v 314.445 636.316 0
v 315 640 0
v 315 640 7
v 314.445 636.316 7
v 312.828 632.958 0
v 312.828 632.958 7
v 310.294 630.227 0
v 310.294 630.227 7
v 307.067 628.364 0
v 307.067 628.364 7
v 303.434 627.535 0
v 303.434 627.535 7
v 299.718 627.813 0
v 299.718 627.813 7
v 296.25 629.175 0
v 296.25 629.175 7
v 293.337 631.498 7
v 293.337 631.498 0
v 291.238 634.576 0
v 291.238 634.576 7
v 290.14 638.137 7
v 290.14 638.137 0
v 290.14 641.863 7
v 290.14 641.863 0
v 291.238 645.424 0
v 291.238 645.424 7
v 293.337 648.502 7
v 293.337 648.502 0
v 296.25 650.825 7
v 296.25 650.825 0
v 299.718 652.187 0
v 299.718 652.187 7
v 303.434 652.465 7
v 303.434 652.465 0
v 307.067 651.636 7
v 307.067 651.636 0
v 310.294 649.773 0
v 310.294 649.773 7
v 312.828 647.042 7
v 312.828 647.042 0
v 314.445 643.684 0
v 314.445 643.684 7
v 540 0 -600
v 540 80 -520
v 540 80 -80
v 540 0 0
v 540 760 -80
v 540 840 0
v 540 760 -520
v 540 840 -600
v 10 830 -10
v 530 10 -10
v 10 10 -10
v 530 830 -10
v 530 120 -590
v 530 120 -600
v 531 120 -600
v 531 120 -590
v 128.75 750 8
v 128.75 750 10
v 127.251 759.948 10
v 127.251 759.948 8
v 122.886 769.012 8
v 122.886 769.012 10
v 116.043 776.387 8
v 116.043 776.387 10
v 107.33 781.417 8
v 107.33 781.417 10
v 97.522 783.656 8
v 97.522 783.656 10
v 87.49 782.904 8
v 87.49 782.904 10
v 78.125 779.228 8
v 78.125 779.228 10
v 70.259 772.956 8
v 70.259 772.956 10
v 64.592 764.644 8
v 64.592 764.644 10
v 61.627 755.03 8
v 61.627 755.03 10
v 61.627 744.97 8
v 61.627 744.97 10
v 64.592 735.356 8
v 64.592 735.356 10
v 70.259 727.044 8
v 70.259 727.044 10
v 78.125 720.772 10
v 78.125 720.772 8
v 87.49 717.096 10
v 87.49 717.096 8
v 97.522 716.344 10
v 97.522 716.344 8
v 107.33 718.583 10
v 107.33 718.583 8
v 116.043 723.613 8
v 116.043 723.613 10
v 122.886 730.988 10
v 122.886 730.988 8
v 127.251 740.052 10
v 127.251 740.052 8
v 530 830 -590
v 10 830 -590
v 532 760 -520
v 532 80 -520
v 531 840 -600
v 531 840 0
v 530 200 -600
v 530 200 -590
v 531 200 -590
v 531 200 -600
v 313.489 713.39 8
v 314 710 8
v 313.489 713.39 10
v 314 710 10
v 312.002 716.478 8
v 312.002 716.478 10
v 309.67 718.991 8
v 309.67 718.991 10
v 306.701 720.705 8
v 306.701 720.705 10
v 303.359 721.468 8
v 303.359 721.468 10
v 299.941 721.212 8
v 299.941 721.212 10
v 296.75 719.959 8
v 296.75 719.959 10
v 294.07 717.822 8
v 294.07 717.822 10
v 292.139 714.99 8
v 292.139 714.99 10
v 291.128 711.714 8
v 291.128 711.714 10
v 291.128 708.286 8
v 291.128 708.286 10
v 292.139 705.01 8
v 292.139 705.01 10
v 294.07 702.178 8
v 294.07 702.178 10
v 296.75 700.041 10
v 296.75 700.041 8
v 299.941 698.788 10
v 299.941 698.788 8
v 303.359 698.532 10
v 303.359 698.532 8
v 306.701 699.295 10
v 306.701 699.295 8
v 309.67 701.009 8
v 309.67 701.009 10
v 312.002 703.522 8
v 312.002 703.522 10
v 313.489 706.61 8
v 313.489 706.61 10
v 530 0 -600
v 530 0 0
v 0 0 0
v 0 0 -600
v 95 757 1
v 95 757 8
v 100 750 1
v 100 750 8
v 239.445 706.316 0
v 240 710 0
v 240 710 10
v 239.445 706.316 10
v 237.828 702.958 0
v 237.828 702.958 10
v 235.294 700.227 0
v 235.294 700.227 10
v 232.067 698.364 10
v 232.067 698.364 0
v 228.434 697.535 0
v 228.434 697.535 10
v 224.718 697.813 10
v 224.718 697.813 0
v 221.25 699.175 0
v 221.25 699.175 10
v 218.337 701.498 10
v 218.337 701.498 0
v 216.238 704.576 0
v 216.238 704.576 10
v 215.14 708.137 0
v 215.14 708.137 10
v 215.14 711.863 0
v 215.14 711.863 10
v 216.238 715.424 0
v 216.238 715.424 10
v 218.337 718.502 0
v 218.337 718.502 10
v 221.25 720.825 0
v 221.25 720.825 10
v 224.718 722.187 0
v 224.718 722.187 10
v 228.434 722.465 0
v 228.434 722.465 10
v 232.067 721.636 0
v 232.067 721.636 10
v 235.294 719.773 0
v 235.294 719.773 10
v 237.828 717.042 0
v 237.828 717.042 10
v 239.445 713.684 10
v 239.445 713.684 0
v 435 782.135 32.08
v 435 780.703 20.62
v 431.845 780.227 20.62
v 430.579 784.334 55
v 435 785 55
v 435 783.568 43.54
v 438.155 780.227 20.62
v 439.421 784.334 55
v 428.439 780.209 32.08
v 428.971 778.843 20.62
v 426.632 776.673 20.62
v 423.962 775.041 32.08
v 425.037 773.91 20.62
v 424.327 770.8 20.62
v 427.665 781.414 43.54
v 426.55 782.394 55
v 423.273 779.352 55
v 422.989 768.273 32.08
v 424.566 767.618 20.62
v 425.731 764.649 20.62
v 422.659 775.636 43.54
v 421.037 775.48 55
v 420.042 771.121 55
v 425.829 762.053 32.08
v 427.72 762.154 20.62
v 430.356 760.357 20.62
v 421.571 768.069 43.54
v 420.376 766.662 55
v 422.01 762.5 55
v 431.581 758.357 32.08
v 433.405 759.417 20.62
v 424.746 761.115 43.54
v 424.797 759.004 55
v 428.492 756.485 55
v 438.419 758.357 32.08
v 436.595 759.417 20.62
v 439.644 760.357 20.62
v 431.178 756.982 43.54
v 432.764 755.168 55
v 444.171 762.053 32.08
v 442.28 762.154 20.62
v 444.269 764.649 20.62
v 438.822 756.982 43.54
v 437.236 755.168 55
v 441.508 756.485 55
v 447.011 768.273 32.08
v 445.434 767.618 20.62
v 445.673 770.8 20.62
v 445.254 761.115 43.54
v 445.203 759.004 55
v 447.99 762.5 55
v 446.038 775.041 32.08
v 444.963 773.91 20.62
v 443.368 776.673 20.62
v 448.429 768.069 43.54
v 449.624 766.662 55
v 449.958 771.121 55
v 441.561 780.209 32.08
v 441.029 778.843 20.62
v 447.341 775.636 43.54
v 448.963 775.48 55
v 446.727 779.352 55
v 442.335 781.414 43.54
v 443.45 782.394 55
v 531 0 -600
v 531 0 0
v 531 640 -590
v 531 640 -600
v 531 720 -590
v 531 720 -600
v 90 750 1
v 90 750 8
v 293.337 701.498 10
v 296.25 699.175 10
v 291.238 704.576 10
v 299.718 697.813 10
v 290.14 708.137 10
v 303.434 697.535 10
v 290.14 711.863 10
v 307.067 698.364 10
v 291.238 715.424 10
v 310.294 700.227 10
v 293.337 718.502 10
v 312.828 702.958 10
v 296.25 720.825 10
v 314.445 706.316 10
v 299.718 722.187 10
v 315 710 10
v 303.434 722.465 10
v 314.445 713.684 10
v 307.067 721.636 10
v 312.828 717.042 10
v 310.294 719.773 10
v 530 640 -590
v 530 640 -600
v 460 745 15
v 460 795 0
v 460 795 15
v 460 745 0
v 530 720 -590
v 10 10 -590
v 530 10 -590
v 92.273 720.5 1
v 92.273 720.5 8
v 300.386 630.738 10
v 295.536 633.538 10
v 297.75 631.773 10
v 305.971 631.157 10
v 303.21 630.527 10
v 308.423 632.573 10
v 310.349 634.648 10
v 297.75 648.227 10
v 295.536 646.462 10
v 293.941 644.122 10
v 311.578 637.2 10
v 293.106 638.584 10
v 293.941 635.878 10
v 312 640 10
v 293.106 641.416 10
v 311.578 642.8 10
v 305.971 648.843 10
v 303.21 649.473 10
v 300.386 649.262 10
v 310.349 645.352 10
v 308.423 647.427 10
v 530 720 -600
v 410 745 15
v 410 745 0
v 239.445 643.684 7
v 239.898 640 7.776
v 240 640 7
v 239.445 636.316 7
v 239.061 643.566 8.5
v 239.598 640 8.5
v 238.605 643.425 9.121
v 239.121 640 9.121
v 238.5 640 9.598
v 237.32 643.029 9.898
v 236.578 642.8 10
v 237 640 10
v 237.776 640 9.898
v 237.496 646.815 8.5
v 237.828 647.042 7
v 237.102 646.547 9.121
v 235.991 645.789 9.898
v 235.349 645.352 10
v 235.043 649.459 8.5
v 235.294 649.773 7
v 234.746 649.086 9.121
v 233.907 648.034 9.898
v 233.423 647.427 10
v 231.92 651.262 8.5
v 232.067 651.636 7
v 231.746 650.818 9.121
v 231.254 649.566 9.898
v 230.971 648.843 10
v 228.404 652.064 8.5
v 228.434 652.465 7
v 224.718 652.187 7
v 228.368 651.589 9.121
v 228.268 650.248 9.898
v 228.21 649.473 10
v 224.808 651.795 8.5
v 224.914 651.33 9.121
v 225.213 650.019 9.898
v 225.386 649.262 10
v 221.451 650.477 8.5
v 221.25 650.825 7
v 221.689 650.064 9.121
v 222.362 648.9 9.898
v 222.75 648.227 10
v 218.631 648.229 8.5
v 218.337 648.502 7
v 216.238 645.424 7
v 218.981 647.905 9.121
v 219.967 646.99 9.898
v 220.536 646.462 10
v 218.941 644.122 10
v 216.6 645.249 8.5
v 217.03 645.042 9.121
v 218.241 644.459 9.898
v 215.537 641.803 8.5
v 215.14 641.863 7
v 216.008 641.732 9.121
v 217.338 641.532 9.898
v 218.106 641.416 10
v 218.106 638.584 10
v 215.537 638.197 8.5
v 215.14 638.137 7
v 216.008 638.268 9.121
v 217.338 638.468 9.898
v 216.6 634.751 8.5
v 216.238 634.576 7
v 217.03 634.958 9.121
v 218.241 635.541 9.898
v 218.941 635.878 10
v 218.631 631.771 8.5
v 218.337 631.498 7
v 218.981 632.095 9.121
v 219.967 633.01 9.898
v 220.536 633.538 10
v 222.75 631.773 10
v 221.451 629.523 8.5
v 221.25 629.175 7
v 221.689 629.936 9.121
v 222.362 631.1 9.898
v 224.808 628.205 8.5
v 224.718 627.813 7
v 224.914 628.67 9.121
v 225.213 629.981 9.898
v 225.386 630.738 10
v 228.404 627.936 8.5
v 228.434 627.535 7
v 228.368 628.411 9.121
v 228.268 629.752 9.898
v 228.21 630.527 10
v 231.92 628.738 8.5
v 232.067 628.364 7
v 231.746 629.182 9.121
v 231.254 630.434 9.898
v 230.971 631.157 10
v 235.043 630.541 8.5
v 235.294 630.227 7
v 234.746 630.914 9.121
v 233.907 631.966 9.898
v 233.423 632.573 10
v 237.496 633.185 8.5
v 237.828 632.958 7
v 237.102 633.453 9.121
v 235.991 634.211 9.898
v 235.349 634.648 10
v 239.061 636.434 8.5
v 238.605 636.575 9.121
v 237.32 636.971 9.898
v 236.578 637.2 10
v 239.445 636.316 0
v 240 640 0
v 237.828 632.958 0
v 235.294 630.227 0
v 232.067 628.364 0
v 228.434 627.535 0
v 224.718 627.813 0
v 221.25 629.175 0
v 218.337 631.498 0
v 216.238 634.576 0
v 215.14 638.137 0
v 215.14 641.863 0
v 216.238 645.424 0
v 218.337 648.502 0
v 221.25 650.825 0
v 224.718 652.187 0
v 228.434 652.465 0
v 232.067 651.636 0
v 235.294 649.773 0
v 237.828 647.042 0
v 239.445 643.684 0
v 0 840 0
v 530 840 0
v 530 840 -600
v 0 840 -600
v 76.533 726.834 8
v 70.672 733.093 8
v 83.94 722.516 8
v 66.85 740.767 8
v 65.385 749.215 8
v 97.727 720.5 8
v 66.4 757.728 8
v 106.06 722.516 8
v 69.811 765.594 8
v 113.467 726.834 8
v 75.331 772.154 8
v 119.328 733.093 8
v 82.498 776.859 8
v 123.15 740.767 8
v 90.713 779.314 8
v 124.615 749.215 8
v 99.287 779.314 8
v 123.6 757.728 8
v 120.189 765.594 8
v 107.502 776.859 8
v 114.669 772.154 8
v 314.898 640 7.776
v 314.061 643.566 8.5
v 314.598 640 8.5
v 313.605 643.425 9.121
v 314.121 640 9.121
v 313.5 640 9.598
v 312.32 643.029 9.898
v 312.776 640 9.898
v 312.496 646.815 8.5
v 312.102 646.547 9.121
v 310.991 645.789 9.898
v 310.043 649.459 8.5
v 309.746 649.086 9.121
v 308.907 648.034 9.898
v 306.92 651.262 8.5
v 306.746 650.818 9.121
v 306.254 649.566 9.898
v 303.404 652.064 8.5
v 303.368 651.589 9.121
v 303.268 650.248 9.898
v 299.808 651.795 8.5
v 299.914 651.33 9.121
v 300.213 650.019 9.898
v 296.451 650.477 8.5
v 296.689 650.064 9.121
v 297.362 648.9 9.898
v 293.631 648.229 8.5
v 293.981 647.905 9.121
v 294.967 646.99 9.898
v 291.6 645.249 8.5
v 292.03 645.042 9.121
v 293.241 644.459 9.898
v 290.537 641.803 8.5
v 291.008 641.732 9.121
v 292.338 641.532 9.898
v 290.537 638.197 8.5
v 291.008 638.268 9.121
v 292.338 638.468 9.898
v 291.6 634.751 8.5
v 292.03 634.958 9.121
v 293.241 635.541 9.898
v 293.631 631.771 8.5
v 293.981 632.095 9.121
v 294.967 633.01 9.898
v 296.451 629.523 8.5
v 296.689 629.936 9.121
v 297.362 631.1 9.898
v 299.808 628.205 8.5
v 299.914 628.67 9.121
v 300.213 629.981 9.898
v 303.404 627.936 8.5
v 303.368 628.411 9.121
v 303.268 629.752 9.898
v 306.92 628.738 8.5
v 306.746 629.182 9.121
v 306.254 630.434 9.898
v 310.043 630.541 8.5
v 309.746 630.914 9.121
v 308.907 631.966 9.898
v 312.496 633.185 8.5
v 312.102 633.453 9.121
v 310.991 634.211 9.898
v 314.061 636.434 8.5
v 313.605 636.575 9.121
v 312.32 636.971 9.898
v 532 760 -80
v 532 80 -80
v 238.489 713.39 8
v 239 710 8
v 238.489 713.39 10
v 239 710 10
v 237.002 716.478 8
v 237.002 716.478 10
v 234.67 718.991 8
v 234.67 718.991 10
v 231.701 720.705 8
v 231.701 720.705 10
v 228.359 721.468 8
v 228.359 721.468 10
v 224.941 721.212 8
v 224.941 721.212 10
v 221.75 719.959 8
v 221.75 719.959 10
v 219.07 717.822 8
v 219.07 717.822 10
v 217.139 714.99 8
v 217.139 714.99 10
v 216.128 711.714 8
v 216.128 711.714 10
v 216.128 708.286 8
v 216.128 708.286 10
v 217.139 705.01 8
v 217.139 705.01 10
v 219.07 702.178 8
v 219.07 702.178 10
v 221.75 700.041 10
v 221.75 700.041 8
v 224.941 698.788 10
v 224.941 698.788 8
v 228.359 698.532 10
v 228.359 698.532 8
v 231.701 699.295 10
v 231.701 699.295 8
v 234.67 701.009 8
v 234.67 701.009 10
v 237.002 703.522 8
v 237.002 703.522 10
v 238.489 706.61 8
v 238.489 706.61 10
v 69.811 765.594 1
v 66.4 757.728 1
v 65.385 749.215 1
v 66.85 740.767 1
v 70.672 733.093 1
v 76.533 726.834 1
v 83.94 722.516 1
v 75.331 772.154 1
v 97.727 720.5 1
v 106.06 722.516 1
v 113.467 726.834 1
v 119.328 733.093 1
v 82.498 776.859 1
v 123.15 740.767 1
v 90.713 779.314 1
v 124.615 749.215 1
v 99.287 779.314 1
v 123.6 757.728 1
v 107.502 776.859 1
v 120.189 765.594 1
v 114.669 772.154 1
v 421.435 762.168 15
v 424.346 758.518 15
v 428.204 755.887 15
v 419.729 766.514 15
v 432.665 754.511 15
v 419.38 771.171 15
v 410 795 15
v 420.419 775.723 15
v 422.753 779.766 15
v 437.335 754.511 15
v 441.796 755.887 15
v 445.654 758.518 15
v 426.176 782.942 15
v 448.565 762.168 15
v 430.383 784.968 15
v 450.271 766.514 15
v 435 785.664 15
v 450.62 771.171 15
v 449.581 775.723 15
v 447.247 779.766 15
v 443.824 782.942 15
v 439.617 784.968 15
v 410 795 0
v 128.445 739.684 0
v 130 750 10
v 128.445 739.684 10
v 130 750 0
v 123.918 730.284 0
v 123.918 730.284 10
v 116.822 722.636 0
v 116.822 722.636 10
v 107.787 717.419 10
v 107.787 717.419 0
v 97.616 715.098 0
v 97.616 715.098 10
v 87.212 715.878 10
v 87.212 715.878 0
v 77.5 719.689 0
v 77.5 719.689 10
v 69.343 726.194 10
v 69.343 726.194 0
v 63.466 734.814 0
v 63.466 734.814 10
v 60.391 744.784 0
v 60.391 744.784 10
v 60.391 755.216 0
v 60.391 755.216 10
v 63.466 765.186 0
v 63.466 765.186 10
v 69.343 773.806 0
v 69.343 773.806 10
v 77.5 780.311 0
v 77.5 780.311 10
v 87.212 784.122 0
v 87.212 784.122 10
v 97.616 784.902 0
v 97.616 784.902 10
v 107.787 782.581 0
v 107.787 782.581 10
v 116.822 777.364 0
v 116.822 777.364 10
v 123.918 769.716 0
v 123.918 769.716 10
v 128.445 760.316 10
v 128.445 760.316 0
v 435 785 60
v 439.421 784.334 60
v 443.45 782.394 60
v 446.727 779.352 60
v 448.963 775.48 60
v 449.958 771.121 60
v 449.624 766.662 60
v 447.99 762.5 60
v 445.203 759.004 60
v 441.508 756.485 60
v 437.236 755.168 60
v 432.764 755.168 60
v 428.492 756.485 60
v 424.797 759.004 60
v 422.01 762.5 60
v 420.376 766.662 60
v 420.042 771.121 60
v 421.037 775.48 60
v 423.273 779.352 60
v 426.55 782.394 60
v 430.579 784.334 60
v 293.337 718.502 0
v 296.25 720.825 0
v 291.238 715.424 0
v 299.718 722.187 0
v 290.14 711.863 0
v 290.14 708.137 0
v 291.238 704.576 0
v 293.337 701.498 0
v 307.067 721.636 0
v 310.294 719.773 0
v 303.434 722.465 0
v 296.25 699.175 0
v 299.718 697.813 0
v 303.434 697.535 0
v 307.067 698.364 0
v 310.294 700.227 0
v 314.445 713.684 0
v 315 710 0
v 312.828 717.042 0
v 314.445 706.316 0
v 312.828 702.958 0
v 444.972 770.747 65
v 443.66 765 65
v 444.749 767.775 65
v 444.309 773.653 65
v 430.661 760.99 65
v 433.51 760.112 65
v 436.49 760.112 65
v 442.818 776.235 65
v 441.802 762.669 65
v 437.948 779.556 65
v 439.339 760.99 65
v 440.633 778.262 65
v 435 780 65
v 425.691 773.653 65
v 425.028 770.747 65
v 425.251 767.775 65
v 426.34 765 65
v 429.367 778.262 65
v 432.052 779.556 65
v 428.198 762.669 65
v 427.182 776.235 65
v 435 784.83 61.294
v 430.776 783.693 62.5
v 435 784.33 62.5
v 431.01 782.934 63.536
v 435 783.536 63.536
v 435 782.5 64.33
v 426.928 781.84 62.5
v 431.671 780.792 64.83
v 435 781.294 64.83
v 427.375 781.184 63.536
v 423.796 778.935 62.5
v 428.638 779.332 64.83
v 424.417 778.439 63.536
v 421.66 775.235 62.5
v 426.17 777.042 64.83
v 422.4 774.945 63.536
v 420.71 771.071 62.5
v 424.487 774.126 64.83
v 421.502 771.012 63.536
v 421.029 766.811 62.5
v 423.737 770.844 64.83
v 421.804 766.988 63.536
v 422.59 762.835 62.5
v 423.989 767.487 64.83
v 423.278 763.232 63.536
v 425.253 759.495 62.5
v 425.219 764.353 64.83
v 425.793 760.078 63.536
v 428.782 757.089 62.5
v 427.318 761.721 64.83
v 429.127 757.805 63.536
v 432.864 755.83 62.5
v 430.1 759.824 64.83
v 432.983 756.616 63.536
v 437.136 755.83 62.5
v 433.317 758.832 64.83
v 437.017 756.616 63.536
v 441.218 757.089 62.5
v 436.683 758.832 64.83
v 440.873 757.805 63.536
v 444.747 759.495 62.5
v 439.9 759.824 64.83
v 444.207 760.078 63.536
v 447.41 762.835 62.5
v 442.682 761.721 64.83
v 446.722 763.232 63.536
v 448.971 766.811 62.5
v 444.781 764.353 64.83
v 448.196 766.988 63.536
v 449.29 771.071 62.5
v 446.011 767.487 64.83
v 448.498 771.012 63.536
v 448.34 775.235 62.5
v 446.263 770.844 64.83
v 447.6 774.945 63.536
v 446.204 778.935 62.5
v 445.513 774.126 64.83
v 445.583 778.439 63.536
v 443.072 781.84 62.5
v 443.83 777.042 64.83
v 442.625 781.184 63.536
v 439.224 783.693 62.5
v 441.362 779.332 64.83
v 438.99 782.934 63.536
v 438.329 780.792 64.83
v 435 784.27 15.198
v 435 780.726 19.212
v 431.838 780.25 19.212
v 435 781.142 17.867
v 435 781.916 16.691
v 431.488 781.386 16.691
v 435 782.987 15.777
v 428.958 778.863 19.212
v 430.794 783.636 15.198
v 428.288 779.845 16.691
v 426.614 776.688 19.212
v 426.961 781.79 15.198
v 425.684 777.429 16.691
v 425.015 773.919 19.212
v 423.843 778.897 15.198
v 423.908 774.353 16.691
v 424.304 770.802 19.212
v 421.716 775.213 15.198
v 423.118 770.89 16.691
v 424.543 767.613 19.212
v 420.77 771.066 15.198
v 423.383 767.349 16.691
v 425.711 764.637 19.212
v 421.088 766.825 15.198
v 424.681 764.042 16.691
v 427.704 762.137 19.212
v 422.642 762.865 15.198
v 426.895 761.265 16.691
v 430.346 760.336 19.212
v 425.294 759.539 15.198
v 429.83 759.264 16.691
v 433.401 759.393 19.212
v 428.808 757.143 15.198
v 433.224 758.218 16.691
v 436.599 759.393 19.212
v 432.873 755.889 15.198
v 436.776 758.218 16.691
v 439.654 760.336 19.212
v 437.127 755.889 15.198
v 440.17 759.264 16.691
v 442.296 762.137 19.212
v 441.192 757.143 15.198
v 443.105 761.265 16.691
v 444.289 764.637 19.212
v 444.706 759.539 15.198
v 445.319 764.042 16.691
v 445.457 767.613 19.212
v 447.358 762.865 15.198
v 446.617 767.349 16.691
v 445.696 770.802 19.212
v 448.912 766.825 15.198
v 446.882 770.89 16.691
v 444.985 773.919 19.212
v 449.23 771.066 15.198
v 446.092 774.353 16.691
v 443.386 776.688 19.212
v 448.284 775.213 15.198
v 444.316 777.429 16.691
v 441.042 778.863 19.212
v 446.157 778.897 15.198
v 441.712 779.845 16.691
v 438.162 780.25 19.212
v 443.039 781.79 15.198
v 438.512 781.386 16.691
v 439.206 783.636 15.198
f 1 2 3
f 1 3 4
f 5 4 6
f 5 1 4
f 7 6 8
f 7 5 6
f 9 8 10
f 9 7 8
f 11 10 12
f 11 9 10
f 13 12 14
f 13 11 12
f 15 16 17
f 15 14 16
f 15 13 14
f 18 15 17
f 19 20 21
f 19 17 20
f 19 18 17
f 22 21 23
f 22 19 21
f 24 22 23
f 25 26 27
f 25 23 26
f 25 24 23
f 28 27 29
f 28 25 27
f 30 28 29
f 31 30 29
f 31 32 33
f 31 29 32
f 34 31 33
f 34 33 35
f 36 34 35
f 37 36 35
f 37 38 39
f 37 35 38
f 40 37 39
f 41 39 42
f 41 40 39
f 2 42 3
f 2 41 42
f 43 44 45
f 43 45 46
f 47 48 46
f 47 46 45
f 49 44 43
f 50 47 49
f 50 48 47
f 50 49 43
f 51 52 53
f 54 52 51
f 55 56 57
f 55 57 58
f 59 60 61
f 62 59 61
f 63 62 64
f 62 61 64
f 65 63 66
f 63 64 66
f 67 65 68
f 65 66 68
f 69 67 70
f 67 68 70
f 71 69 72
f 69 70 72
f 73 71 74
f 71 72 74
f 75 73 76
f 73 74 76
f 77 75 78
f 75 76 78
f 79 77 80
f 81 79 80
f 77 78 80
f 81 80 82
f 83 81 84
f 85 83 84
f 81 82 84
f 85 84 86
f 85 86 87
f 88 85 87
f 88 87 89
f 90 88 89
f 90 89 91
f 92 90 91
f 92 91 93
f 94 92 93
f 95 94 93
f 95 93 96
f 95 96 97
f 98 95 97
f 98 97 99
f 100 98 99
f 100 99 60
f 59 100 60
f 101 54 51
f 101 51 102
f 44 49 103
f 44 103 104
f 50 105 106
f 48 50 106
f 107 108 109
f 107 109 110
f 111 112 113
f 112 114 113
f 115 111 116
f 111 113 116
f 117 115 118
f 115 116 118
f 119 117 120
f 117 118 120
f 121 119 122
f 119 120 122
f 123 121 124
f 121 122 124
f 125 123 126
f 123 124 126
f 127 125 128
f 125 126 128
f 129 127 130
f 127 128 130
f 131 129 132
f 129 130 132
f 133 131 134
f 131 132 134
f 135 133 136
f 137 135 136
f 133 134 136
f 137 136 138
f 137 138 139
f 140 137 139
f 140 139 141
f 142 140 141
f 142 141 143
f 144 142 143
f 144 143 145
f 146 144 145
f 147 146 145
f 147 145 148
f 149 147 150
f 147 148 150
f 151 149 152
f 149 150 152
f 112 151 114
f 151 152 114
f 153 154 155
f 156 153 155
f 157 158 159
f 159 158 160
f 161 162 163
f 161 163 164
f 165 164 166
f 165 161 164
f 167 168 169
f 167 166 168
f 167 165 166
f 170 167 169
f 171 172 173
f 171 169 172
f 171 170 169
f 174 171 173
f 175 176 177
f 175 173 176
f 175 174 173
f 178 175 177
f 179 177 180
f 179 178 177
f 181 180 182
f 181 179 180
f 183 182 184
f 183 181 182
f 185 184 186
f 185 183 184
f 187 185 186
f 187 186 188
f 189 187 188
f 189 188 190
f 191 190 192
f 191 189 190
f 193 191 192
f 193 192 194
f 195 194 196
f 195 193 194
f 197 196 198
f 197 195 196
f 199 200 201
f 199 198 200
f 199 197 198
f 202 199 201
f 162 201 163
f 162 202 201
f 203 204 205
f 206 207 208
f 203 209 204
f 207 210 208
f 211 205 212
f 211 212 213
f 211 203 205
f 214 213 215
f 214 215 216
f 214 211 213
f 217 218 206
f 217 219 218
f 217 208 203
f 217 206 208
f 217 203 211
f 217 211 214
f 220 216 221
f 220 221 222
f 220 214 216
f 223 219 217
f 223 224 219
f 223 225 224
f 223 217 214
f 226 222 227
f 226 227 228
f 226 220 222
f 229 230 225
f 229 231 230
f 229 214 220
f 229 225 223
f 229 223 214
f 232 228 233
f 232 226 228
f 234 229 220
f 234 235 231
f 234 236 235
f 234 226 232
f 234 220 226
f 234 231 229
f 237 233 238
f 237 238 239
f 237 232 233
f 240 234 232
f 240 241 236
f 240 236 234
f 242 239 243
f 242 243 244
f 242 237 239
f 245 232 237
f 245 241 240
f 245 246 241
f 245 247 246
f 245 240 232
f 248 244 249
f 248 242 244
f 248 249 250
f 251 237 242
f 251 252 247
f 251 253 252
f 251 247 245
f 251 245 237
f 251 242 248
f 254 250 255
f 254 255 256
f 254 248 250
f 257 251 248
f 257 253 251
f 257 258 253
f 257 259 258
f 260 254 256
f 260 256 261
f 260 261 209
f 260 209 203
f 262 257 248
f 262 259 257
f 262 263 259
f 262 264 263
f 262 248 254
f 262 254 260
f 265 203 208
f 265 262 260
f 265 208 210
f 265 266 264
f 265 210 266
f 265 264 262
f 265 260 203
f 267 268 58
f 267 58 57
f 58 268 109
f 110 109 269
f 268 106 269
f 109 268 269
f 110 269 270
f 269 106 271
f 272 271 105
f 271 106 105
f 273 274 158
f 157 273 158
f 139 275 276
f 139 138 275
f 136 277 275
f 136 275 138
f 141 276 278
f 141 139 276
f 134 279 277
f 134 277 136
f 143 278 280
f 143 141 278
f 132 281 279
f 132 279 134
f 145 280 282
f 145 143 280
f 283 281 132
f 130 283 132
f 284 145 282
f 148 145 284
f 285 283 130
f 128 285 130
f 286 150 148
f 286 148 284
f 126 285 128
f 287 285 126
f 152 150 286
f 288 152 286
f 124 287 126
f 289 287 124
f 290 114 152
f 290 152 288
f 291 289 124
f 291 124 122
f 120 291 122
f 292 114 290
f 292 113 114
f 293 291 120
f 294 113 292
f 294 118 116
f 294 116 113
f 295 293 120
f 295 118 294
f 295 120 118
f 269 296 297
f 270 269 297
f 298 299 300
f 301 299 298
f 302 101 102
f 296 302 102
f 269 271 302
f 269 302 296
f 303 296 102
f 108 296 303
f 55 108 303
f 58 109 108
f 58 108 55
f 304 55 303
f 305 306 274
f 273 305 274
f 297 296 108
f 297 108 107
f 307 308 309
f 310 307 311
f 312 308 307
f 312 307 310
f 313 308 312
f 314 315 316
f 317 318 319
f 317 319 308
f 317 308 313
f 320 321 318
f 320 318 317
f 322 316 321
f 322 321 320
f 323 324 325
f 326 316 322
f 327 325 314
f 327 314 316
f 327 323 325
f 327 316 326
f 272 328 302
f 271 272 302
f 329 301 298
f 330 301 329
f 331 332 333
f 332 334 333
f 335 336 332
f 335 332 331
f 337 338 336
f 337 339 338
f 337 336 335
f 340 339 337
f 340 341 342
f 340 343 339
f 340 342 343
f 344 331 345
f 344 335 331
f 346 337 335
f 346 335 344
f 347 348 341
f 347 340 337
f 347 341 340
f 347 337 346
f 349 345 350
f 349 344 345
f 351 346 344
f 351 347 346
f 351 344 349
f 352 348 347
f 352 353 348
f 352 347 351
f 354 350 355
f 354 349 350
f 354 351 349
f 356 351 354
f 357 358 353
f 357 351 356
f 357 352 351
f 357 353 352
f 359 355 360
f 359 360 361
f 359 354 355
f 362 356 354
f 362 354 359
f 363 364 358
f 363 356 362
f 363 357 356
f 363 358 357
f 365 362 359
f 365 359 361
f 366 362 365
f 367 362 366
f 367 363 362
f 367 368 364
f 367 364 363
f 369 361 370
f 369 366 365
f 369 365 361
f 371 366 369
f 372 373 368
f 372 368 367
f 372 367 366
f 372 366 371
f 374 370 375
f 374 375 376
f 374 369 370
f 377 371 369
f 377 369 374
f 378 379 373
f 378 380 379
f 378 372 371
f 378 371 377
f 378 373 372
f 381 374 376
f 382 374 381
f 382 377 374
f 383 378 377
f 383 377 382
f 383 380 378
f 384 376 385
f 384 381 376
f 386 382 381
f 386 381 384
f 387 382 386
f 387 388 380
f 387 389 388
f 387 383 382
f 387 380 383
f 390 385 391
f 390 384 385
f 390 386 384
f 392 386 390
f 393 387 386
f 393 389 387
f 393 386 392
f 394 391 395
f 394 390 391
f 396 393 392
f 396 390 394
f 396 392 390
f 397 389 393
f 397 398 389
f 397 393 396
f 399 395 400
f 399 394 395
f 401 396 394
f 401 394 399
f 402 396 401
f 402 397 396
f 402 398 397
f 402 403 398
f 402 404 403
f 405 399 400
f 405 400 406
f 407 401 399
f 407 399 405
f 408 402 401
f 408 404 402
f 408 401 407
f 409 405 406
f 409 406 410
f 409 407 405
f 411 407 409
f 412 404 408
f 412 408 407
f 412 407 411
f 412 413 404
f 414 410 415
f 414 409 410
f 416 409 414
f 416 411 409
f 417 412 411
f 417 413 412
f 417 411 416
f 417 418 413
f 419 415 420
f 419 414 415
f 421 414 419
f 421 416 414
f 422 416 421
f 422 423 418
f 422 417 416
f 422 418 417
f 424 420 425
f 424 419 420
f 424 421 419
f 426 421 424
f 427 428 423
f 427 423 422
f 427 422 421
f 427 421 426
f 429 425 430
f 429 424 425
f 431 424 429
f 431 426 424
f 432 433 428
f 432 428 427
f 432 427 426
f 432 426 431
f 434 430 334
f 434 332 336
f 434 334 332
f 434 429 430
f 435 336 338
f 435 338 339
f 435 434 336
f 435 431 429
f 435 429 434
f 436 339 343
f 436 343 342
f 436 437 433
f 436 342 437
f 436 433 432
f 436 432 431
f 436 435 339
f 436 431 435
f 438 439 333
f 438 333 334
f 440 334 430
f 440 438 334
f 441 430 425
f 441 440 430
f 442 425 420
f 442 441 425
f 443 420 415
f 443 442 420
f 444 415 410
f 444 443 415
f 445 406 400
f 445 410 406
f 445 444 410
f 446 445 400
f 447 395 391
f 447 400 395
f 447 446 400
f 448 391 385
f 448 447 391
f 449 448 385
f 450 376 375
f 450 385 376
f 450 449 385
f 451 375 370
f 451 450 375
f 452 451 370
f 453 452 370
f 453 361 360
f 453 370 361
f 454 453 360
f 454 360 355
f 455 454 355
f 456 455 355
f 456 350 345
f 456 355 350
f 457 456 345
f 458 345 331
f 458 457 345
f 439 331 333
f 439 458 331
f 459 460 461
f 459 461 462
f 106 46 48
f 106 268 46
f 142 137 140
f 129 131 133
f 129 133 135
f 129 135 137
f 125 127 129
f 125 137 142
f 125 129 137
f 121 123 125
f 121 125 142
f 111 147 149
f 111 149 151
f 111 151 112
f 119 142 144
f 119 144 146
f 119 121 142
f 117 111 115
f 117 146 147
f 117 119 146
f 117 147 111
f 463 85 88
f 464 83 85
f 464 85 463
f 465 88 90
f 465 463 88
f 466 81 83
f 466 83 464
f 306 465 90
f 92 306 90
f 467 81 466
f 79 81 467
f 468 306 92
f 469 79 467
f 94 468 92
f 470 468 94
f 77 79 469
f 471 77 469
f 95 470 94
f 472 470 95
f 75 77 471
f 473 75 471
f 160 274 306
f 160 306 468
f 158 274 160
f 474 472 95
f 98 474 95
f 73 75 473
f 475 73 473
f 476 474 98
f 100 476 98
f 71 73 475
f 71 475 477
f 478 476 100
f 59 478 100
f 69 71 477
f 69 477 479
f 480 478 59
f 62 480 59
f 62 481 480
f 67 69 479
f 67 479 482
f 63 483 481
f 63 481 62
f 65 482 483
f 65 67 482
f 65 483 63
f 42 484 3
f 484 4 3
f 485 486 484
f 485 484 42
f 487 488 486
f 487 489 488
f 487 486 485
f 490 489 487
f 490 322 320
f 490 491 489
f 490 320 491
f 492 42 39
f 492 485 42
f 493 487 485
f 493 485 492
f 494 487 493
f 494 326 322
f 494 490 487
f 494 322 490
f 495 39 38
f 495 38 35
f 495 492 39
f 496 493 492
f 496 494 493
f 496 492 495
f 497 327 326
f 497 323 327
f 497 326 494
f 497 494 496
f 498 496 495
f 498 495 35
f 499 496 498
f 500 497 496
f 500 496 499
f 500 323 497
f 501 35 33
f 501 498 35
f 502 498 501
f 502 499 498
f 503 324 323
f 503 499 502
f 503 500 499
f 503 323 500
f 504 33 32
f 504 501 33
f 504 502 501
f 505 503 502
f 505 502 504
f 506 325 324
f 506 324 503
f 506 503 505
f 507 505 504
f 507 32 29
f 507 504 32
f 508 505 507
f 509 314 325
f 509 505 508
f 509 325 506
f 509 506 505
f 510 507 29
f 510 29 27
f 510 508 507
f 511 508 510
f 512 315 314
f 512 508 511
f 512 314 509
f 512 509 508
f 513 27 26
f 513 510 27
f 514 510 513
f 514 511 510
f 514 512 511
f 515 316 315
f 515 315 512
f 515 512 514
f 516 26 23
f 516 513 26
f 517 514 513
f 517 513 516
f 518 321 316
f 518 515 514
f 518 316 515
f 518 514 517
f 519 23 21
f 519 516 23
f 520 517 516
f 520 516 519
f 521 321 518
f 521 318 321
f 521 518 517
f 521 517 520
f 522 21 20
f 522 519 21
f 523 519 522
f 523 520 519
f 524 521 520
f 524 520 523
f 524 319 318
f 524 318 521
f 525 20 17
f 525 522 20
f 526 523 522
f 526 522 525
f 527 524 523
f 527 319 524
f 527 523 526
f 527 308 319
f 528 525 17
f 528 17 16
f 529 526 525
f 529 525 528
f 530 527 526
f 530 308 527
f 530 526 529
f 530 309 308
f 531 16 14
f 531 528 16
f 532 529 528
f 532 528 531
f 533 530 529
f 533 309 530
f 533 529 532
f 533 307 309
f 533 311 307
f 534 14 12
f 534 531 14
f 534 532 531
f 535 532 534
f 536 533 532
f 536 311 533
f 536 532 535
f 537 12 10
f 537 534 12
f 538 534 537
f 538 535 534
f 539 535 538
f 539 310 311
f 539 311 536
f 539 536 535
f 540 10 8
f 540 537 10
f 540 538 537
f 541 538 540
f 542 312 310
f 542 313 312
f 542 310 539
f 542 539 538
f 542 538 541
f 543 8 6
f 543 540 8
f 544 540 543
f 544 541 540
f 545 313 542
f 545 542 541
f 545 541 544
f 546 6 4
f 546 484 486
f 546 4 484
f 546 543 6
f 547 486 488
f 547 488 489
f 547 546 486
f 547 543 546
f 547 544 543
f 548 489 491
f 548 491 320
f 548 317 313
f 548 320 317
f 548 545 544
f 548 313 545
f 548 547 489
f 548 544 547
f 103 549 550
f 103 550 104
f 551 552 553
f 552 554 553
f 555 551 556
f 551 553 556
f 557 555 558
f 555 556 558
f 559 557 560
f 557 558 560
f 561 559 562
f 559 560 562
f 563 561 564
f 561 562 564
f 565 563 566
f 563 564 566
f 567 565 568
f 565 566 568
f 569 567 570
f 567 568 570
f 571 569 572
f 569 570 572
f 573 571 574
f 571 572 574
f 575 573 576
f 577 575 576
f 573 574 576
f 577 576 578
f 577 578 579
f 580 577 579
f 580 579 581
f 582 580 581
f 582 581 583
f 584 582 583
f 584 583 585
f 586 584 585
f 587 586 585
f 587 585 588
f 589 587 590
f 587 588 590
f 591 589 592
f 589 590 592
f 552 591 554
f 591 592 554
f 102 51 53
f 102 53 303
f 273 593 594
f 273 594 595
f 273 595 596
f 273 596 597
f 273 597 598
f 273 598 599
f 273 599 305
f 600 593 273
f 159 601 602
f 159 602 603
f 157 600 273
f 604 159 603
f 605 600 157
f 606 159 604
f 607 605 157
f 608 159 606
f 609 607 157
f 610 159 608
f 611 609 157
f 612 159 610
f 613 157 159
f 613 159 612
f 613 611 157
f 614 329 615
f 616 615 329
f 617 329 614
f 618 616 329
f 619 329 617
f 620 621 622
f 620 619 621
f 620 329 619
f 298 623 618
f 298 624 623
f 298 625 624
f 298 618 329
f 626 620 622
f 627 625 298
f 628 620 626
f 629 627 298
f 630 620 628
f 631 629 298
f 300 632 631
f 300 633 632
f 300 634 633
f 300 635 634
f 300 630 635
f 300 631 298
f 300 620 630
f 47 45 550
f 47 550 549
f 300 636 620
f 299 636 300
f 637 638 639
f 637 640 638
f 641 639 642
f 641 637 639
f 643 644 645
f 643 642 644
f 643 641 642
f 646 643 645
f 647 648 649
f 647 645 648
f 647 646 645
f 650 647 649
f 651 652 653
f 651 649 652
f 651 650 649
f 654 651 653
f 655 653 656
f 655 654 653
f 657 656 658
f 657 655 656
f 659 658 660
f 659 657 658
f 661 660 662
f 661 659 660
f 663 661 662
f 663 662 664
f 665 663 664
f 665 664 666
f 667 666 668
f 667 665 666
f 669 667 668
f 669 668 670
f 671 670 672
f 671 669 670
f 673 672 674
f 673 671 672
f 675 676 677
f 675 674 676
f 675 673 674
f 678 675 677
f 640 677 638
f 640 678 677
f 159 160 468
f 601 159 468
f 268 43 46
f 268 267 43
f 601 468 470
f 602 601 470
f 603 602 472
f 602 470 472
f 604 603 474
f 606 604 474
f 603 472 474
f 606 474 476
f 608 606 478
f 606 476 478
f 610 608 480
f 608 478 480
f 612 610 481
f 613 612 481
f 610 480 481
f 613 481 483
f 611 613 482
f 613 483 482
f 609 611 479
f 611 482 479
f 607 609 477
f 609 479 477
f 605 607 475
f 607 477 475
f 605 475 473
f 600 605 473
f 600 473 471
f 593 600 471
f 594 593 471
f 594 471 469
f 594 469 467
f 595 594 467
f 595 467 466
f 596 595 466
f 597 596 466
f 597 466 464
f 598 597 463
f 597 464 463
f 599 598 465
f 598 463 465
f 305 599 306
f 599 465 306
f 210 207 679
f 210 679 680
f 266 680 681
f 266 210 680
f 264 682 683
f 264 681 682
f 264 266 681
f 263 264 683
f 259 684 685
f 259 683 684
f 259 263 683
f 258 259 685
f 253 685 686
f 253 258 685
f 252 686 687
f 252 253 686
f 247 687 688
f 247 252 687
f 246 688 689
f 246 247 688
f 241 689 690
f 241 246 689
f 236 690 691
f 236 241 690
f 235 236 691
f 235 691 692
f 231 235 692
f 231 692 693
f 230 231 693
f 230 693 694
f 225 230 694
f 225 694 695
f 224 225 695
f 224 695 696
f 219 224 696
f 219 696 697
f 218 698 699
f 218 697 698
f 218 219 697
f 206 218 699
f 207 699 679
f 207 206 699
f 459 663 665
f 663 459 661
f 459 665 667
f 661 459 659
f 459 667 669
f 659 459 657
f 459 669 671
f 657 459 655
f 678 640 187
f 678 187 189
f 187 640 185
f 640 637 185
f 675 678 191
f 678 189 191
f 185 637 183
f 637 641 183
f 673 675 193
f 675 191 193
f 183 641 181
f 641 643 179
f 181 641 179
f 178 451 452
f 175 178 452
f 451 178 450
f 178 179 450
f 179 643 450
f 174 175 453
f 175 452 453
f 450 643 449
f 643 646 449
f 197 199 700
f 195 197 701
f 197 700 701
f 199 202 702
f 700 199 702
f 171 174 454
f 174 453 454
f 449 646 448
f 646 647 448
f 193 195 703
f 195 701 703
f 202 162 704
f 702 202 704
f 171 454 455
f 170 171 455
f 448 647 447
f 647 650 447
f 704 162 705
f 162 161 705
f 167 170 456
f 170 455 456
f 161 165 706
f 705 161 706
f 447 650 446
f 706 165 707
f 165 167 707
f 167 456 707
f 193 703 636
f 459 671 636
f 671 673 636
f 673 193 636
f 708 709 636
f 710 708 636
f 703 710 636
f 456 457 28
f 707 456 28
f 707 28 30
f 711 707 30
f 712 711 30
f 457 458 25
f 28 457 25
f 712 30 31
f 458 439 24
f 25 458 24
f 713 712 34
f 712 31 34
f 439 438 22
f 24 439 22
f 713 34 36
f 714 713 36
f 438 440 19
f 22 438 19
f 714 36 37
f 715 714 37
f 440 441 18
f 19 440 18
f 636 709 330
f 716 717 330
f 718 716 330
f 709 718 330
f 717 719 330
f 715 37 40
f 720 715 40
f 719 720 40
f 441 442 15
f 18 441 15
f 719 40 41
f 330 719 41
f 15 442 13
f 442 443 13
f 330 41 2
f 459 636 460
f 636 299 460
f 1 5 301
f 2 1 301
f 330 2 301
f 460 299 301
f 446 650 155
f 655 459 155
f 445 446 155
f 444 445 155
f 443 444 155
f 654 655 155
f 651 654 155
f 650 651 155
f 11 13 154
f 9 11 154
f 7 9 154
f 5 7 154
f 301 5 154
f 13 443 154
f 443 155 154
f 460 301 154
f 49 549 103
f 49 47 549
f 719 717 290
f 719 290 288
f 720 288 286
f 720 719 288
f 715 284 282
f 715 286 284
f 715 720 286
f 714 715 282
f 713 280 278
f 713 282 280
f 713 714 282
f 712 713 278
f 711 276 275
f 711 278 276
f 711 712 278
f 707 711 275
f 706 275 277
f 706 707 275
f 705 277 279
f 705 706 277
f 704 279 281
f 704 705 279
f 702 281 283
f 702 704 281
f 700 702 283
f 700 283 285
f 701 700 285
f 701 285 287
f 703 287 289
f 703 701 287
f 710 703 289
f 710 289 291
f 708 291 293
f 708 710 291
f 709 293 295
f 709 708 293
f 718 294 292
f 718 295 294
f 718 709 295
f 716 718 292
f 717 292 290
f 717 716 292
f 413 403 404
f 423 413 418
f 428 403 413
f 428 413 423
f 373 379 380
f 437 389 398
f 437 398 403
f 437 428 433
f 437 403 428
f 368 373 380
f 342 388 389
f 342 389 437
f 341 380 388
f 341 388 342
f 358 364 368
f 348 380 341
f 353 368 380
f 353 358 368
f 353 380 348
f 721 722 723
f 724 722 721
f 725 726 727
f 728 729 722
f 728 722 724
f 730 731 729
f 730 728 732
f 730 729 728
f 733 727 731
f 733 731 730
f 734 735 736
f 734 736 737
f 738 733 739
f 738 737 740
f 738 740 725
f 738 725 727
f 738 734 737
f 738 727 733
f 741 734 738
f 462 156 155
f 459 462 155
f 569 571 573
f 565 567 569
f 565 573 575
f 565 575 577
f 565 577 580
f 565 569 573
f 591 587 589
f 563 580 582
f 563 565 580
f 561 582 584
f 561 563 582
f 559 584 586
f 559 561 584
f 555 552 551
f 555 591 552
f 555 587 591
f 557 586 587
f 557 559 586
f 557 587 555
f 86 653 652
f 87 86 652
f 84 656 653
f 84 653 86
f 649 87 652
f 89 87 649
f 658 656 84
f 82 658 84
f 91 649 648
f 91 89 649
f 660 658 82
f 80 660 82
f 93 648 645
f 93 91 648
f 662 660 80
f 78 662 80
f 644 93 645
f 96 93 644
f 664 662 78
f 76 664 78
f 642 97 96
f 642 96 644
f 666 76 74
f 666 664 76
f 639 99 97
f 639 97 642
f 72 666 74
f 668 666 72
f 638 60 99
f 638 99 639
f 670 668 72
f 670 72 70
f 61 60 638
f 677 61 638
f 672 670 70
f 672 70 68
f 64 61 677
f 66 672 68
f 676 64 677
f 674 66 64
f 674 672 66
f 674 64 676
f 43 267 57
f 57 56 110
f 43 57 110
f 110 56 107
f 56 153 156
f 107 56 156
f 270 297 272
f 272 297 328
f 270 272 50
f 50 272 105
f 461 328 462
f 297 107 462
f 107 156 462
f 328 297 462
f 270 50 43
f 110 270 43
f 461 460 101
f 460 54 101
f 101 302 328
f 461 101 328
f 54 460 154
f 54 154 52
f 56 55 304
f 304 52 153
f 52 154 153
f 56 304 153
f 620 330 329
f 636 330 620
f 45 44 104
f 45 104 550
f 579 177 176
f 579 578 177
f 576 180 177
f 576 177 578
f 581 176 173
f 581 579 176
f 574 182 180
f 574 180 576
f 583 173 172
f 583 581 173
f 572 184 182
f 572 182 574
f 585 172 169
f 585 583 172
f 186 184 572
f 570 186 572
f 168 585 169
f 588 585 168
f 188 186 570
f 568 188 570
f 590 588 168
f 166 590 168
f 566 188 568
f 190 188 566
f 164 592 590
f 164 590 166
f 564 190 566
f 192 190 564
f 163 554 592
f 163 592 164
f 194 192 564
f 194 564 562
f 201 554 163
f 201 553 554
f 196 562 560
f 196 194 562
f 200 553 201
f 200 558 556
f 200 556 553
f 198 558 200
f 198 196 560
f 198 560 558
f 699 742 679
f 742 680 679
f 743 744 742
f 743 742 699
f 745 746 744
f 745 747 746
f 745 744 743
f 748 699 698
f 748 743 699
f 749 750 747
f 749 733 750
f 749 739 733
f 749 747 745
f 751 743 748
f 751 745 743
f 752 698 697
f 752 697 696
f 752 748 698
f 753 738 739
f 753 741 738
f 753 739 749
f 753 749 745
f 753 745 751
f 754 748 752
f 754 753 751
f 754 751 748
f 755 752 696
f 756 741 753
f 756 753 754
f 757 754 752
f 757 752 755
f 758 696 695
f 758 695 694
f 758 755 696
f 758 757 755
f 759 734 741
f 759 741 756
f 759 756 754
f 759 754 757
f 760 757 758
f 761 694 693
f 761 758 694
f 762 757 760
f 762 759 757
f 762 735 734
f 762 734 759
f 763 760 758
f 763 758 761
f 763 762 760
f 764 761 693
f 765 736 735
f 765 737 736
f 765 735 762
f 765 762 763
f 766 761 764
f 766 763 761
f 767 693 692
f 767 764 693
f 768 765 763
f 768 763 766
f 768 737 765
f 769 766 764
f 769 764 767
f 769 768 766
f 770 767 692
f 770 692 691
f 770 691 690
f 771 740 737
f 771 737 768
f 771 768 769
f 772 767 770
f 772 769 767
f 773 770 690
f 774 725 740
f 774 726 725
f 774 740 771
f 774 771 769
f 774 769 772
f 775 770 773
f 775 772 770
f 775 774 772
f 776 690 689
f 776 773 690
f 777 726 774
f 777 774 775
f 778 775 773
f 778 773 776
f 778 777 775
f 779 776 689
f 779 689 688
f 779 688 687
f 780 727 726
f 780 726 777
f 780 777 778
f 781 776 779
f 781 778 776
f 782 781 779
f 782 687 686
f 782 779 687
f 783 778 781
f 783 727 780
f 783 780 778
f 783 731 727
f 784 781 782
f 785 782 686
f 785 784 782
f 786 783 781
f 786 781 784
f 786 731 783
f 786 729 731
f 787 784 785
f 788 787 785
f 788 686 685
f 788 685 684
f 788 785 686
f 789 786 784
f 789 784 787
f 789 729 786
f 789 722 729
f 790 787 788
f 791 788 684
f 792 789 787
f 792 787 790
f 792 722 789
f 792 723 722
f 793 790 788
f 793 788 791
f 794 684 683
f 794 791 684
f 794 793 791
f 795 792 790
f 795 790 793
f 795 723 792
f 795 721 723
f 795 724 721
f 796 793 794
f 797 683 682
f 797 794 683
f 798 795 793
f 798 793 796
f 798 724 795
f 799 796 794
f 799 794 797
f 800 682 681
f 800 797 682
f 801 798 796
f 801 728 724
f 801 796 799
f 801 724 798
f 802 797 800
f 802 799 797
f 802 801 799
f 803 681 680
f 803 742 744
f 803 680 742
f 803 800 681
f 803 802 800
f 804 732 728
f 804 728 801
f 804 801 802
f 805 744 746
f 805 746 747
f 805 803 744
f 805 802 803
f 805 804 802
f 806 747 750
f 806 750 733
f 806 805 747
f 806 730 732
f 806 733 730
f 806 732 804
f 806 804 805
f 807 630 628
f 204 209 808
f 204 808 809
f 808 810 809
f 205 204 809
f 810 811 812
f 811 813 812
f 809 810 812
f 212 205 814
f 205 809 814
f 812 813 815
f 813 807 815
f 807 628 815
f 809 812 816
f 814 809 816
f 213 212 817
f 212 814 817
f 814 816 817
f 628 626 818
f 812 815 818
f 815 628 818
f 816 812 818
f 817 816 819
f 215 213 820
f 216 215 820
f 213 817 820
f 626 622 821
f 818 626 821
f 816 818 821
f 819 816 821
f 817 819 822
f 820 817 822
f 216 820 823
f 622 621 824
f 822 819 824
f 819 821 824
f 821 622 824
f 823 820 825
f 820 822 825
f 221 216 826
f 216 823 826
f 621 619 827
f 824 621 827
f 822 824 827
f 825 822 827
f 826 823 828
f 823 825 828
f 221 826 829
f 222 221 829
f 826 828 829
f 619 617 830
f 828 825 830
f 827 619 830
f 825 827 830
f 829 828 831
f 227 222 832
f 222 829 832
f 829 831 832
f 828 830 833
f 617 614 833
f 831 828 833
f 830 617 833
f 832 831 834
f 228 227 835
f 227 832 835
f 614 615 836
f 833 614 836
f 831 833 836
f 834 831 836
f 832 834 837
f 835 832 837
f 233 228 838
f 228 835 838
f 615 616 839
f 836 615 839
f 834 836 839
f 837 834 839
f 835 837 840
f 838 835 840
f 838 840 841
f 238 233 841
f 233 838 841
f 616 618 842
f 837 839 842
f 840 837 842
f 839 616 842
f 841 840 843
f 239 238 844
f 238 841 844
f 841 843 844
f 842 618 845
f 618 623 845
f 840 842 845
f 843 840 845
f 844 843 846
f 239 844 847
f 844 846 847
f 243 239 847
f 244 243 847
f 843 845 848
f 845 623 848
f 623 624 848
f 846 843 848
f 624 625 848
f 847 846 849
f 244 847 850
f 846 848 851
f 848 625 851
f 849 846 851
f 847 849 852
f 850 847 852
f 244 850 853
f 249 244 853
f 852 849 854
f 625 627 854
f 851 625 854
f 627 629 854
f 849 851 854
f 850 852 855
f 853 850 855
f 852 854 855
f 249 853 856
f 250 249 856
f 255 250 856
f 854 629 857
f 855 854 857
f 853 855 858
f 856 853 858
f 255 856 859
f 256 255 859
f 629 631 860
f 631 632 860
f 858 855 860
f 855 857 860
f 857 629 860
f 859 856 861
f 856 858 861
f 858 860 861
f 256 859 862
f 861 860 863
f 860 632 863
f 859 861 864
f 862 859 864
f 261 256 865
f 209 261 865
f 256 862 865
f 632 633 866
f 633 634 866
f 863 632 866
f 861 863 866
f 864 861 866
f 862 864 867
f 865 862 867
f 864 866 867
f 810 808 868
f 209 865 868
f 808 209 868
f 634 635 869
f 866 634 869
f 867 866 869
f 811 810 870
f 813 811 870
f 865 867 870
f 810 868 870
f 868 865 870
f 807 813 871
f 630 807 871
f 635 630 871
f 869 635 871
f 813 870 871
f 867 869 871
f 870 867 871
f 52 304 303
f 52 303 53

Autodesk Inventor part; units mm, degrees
ref_plane "YZ Plane" through (0, 0, 0) normal (1, 0, 0) x (0, 1, 0)
ref_plane "XZ Plane" through (0, 0, 0) normal (0, 1, 0) x (-1, 0, 0)
ref_plane "XY Plane" through (0, 0, 0) normal (0, 0, 1) x (1, 0, 0)
sketch "Boceto1" plane through (0, 0, 0) normal (0, 1, 0) x (-1, 0, 0)
  line L0 (0, 0) -> (-530, 0)
  line L1 (-530, 0) -> (-530, -600)
  line L2 (-530, -600) -> (0, -600)
  line L3 (0, -600) -> (0, 0)
  dimension "d0" = 530
  dimension "d1" = 600
extrude "Extrusión1" add sketch "Boceto1" along normal blind 840
sketch "Boceto2" plane through (530, 0, 0) normal (1, 0, 0) x (0, 0, -1)
  line L0 (0, 0) -> (0, 840) projected
  line L1 (0, 840) -> (10, 840)
  line L2 (10, 840) -> (10, 830)
  line L3 (10, 830) -> (0, 830)
  line L4 (0, 830) -> (0, 840)
  line L5 (10, 830) -> (590, 830)
  line L6 (590, 830) -> (590, 10)
  line L7 (590, 10) -> (10, 10)
  line L8 (10, 10) -> (10, 830)
  dimension "d4" = 10
  dimension "d5" = 10
  dimension "d6" = 580
  dimension "d7" = 820
extrude "Extrusión2" cut sketch "Boceto2" against normal blind 520 contours L5 L6 L7 L8
sketch "Boceto3" plane through (0, 0, 0) normal (0, 0, 1) x (1, 0, 0)
  line L0 (530, 830) -> (10, 830) projected
  line L1 (10, 830) -> (520, 830) construction
  line L2 (520, 830) -> (520, 580) construction
  line L3 (520, 580) -> (10, 580) construction
  line L4 (10, 580) -> (10, 830) construction
  line L5 (265, 830) -> (265, 580) construction
  line L6 (265, 580) -> (265, 640)
  line L7 (265, 640) -> (290, 640) construction
  line L8 (265, 640) -> (240, 640) construction
  line L9 (290, 640) -> (302.5, 640) construction
  line L10 (240, 640) -> (227.5, 640) construction
  circle A0 centre (302.5, 640) radius 12.5
  circle A1 centre (227.5, 640) radius 12.5
  line L11 (227.5, 640) -> (227.5, 710) construction
  line L12 (302.5, 640) -> (302.5, 710) construction
  circle A2 centre (227.5, 710) radius 12.5
  circle A3 centre (302.5, 710) radius 12.5
  line L13 (10, 830) -> (10, 10) construction
  line L14 (10, 830) -> (10, 705) construction
  point P0 (0, 0)
  dimension "d10" = 510
  dimension "d11" = 250
  dimension "d12" = 255
  dimension "d13" = 0
  dimension "d14" = 60
  dimension "d15" = 25
  dimension "d16" = 25
  dimension "d17" = 12.5
  dimension "d18" = 12.5
  dimension "d19" = 70
  dimension "d20" = 70
  dimension "d21" = 25
  dimension "d22" = 25
  dimension "d23" = 125
extrude "Extrusión3" add sketch "Boceto3" along normal blind 10
sketch "Boceto4" plane through (302.5, 710, 10) normal (0, 0, 1) x (1, 0, 0)
  circle A0 centre (0, 0) radius 11.5
  circle A1 centre (-75, 0) radius 12.5 projected
  circle A2 centre (-75, 0) radius 11.5
  circle A3 centre (-75, 0) radius 12.5
  circle A4 centre (0, -70) radius 12.5 projected
  circle A5 centre (-75, 0) radius 12.5 projected
  circle A6 centre (-75, -70) radius 12.5 projected
  circle A7 centre (0, 0) radius 12.5 projected
  line L0 (-302.5, -710) -> (227.5, -710) projected
  line L1 (227.5, -710) -> (227.5, 130) projected
  line L2 (-302.5, 130) -> (227.5, 130) projected
  line L3 (-302.5, -710) -> (-302.5, 130) projected
  line L4 (-302.5, -710) -> (-302.5, 130) projected
  line L5 (0, 0) -> (-302.5, 0)
  line L6 (-302.5, 0) -> (-302.5, -710)
  line L7 (-302.5, -710) -> (0, -710)
  line L8 (0, -710) -> (0, 0)
  dimension "d26" = 23
  dimension "d27" = 23
  dimension "d29" = 75
  dimension "d30" = 710
  dimension "d31" = 302.5
extrude "Extrusión4" cut sketch "Boceto4" against normal blind 2 contours A0 L8 L5 | L5 L8 A0 | L5 A2 | A2 L5
fillet "Empalme1" radius 3 2 edges at (215, 640, 10) (290, 640, 10)
sketch "Boceto5" plane through (0, 0, 0) normal (0, 0, 1) x (1, 0, 0)
  circle A0 centre (302.5, 640) radius 12.5 projected
  circle A1 centre (227.5, 710) radius 12.5 projected
  circle A2 centre (227.5, 640) radius 12.5 projected
  circle A3 centre (302.5, 710) radius 12.5 projected
  line L0 (0, 0) -> (530, 0) projected
  line L1 (530, 0) -> (530, 840) projected
  line L2 (0, 840) -> (530, 840) projected
  line L3 (0, 0) -> (0, 840) projected
  line L4 (530, 830) -> (10, 830) construction
  line L5 (10, 830) -> (520, 830) construction
  line L6 (520, 830) -> (520, 630) construction
  line L7 (520, 630) -> (10, 630) construction
  line L8 (10, 630) -> (10, 830) construction
  line L9 (520, 630) -> (435, 630) construction
  line L10 (435, 630) -> (435, 770) construction
  line L11 (10, 630) -> (75, 630) construction
  line L12 (75, 630) -> (75, 770) construction
  line L13 (435, 770) -> (435, 795) construction
  line L14 (435, 795) -> (410, 795) construction
  line L15 (410, 795) -> (460, 795)
  line L16 (460, 795) -> (460, 745)
  line L17 (460, 745) -> (410, 745)
  line L18 (410, 745) -> (410, 795)
  dimension "d35" = 510
  dimension "d36" = 200
  dimension "d37" = 85
  dimension "d38" = 140
  dimension "d39" = 65
  dimension "d40" = 140
  dimension "d41" = 25
  dimension "d42" = 25
  dimension "d43" = 50
  dimension "d44" = 50
extrude "Extrusión5" add sketch "Boceto5" along normal blind 15 contours L15 L16 L17 L18
sketch "Boceto7" plane through (0, 0, 15) normal (0, 0, 1) x (1, 0, 0)
  line L0 (410, 745) -> (460, 745) construction
  line L1 (460, 745) -> (460, 795) construction
  line L2 (460, 795) -> (410, 795) construction
  line L3 (410, 795) -> (410, 745) construction
  line L4 (460, 745) -> (410, 745) construction
  line L5 (410, 745) -> (435, 745) construction
  line L6 (435, 745) -> (435, 770) construction
  line L7 (435, 770) -> (410, 770) construction
  line L8 (410, 770) -> (410, 745) construction
  point P0 (0, 0)
  dimension "d53" = 25
  dimension "d54" = 25
ref_plane "Plano de trabajo1" through (435, 770, 15) normal (-1, 0, 0) x (0, -1, 0)
sketch "Boceto8" plane through (435, 770, 15) normal (-1, 0, 0) x (0, -1, 0)
  line L0 (-25, 0) -> (25, 0) construction
  line L1 (0, 0) -> (0, 50)
  line L2 (0, 0) -> (50, 0) construction
  line L3 (0, 50) -> (-15, 50)
  line L4 (0, 50) -> (15, 50) construction
  line L5 (-15, 50) -> (-15, 40)
  line L6 (0, 0) -> (-10, 0)
  line L7 (-10, 0) -> (-15, 40)
  point P0 (770, -15)
  dimension "d55" = 50
  dimension "d56" = 90
  dimension "d57" = 15
  dimension "d58" = 180
  dimension "d59" = 10
  dimension "d60" = 10
revolve "Revolución1" add sketch "Boceto8" angle 360 about axis through (435, 770, 15) along (0, 0, 1)
fillet "Empalme3" radius 5 1 edges at (435, 755, 65)
fillet "Empalme4" radius 5 1 edges at (435, 760, 15)
sketch "Boceto9" plane through (0, 0, 0) normal (0, 0, 1) x (1, 0, 0)
  line L0 (530, 830) -> (10, 830) construction
  line L1 (10, 830) -> (10, 10) construction
  line L2 (10, 830) -> (520, 830) construction
  line L3 (520, 830) -> (520, 630) construction
  line L4 (520, 630) -> (10, 630) construction
  line L5 (10, 630) -> (10, 830) construction
  line L6 (10, 630) -> (95, 630) construction
  line L7 (95, 630) -> (95, 750) construction
  line L8 (95, 750) -> (10, 750) construction
  line L9 (10, 750) -> (10, 630) construction
  line L10 (95, 750) -> (95, 785) construction
  circle A0 centre (95, 750) radius 35
  point P0 (0, 0)
  dimension "d64" = 510
  dimension "d65" = 200
  dimension "d66" = 85
  dimension "d67" = 120
  dimension "d68" = 35
  dimension "d69" = 70
extrude "Extrusión7" add sketch "Boceto9" along normal blind 10
sketch "Boceto10" plane through (95, 750, 10) normal (0, 0, 1) x (1, 0, 0)
  circle A0 centre (0, 0) radius 30
  line L0 (0, 0) -> (0, 7) construction
  line L1 (0, 0) -> (-5, 0) construction
  line L2 (0, 0) -> (5, 0) construction
  line L3 (0, -30) -> (0, -29.5) construction
  line L4 (0, -29.5) -> (5.454356, -29.5) construction
  line L5 (0, -29.5) -> (-5.454356, -29.5) construction
  line L6 (0, -29.5) -> (-2.727178, -29.5) construction
  line L7 (0, -29.5) -> (2.727178, -29.5) construction
  line L8 (-5, 0) -> (0, 7)
  line L9 (0, 7) -> (5, 0)
  line L10 (2.727178, -29.5) -> (5, 0)
  line L11 (-5, 0) -> (-2.727178, -29.5)
  circle A1 centre (0, 0) radius 35
  circle A2 centre (0, 0) radius 29.625791
  point P0 (-95, -750)
  point P1 (2.727178, -29.5)
  dimension "d72" = 60
  dimension "d73" = 7
  dimension "d74" = 5
  dimension "d75" = 5
  dimension "d76" = 0.5
sketch "Boceto10 outline for Extrusión8" plane through (95, 750, 10) normal (0, 0, 1) x (1, 0, 0)
  line L0 (0, 7) -> (5, 0)
  line L1 (-5, 0) -> (0, 7)
  line L2 (-2.727178, -29.5) -> (-5, 0)
  arc A0 (2.727178, -29.5) -> (-2.727178, -29.5) centre (0, 0) ccw
  line L3 (5, 0) -> (2.727178, -29.5)
extrude "Extrusión8" cut sketch "Boceto10 outline for Extrusión8" against normal blind 9
sketch "Boceto11" plane through (95, 750, 10) normal (0, 0, 1) x (1, 0, 0)
  circle A0 centre (0, 0) radius 33.75
  point P0 (-95, -750)
  dimension "d79" = 67.5
extrude "Extrusión9" cut sketch "Boceto11" against normal blind 2
sketch "Boceto12" plane through (530, 0, 0) normal (1, 0, 0) x (0, 0, -1)
  line L0 (10, 830) -> (590, 830) construction
  line L1 (590, 830) -> (590, 10) construction
  line L2 (590, 10) -> (10, 10) construction
  line L3 (10, 10) -> (10, 830) construction
  line L4 (0, 0) -> (600, 0) construction
  line L5 (600, 0) -> (600, 840) construction
  line L6 (0, 840) -> (600, 840) construction
  line L7 (0, 0) -> (0, 840) construction
  line L8 (600, 0) -> (600, 840) construction
  line L9 (600, 840) -> (600, 720) construction
  line L10 (600, 0) -> (0, 0) construction
  line L11 (600, 0) -> (600, 120) construction
  line L12 (590, 830) -> (590, 10) projected
  line L13 (600, 120) -> (590, 120)
  line L14 (590, 120) -> (590, 200)
  line L15 (590, 200) -> (600, 200)
  line L16 (600, 200) -> (600, 120)
  line L17 (600, 720) -> (590, 720)
  line L18 (590, 720) -> (590, 640)
  line L19 (590, 640) -> (600, 640)
  line L20 (600, 640) -> (600, 720)
  dimension "d82" = 120
  dimension "d83" = 120
  dimension "d84" = 80
  dimension "d85" = 80
extrude "Extrusión10" add sketch "Boceto12" along normal blind 1
sketch "Boceto13" plane through (531, 0, 0) normal (1, 0, 0) x (0, 0, -1)
  line L0 (600, 0) -> (0, 0) projected
  line L1 (0, 0) -> (0, 840) projected
  line L2 (600, 840) -> (0, 840) projected
  line L3 (600, 0) -> (600, 840) projected
extrude "Extrusión11" add sketch "Boceto13" along normal blind 9
sketch "Boceto14" plane through (540, 0, 0) normal (1, 0, 0) x (0, 0, -1)
  line L0 (0, 0) -> (600, 0) construction
  line L1 (600, 0) -> (600, 840) construction
  line L2 (600, 840) -> (0, 840) construction
  line L3 (0, 840) -> (0, 0) construction
  line L4 (0, 840) -> (0, 0) construction
  line L5 (0, 840) -> (80, 840) construction
  line L6 (80, 840) -> (80, 760) construction
  line L7 (80, 760) -> (0, 760) construction
  line L8 (0, 760) -> (0, 840) construction
  line L9 (600, 0) -> (520, 0) construction
  line L10 (520, 0) -> (520, 80) construction
  line L11 (520, 80) -> (600, 80) construction
  line L12 (600, 80) -> (600, 0) construction
  line L13 (80, 760) -> (520, 760)
  line L14 (520, 760) -> (520, 80)
  line L15 (520, 80) -> (80, 80)
  line L16 (80, 80) -> (80, 760)
  dimension "d90" = 80
  dimension "d91" = 80
  dimension "d92" = 80
  dimension "d93" = 80
extrude "Extrusión12" cut sketch "Boceto14" against normal blind 8
properties part number "Tablero Maya"
